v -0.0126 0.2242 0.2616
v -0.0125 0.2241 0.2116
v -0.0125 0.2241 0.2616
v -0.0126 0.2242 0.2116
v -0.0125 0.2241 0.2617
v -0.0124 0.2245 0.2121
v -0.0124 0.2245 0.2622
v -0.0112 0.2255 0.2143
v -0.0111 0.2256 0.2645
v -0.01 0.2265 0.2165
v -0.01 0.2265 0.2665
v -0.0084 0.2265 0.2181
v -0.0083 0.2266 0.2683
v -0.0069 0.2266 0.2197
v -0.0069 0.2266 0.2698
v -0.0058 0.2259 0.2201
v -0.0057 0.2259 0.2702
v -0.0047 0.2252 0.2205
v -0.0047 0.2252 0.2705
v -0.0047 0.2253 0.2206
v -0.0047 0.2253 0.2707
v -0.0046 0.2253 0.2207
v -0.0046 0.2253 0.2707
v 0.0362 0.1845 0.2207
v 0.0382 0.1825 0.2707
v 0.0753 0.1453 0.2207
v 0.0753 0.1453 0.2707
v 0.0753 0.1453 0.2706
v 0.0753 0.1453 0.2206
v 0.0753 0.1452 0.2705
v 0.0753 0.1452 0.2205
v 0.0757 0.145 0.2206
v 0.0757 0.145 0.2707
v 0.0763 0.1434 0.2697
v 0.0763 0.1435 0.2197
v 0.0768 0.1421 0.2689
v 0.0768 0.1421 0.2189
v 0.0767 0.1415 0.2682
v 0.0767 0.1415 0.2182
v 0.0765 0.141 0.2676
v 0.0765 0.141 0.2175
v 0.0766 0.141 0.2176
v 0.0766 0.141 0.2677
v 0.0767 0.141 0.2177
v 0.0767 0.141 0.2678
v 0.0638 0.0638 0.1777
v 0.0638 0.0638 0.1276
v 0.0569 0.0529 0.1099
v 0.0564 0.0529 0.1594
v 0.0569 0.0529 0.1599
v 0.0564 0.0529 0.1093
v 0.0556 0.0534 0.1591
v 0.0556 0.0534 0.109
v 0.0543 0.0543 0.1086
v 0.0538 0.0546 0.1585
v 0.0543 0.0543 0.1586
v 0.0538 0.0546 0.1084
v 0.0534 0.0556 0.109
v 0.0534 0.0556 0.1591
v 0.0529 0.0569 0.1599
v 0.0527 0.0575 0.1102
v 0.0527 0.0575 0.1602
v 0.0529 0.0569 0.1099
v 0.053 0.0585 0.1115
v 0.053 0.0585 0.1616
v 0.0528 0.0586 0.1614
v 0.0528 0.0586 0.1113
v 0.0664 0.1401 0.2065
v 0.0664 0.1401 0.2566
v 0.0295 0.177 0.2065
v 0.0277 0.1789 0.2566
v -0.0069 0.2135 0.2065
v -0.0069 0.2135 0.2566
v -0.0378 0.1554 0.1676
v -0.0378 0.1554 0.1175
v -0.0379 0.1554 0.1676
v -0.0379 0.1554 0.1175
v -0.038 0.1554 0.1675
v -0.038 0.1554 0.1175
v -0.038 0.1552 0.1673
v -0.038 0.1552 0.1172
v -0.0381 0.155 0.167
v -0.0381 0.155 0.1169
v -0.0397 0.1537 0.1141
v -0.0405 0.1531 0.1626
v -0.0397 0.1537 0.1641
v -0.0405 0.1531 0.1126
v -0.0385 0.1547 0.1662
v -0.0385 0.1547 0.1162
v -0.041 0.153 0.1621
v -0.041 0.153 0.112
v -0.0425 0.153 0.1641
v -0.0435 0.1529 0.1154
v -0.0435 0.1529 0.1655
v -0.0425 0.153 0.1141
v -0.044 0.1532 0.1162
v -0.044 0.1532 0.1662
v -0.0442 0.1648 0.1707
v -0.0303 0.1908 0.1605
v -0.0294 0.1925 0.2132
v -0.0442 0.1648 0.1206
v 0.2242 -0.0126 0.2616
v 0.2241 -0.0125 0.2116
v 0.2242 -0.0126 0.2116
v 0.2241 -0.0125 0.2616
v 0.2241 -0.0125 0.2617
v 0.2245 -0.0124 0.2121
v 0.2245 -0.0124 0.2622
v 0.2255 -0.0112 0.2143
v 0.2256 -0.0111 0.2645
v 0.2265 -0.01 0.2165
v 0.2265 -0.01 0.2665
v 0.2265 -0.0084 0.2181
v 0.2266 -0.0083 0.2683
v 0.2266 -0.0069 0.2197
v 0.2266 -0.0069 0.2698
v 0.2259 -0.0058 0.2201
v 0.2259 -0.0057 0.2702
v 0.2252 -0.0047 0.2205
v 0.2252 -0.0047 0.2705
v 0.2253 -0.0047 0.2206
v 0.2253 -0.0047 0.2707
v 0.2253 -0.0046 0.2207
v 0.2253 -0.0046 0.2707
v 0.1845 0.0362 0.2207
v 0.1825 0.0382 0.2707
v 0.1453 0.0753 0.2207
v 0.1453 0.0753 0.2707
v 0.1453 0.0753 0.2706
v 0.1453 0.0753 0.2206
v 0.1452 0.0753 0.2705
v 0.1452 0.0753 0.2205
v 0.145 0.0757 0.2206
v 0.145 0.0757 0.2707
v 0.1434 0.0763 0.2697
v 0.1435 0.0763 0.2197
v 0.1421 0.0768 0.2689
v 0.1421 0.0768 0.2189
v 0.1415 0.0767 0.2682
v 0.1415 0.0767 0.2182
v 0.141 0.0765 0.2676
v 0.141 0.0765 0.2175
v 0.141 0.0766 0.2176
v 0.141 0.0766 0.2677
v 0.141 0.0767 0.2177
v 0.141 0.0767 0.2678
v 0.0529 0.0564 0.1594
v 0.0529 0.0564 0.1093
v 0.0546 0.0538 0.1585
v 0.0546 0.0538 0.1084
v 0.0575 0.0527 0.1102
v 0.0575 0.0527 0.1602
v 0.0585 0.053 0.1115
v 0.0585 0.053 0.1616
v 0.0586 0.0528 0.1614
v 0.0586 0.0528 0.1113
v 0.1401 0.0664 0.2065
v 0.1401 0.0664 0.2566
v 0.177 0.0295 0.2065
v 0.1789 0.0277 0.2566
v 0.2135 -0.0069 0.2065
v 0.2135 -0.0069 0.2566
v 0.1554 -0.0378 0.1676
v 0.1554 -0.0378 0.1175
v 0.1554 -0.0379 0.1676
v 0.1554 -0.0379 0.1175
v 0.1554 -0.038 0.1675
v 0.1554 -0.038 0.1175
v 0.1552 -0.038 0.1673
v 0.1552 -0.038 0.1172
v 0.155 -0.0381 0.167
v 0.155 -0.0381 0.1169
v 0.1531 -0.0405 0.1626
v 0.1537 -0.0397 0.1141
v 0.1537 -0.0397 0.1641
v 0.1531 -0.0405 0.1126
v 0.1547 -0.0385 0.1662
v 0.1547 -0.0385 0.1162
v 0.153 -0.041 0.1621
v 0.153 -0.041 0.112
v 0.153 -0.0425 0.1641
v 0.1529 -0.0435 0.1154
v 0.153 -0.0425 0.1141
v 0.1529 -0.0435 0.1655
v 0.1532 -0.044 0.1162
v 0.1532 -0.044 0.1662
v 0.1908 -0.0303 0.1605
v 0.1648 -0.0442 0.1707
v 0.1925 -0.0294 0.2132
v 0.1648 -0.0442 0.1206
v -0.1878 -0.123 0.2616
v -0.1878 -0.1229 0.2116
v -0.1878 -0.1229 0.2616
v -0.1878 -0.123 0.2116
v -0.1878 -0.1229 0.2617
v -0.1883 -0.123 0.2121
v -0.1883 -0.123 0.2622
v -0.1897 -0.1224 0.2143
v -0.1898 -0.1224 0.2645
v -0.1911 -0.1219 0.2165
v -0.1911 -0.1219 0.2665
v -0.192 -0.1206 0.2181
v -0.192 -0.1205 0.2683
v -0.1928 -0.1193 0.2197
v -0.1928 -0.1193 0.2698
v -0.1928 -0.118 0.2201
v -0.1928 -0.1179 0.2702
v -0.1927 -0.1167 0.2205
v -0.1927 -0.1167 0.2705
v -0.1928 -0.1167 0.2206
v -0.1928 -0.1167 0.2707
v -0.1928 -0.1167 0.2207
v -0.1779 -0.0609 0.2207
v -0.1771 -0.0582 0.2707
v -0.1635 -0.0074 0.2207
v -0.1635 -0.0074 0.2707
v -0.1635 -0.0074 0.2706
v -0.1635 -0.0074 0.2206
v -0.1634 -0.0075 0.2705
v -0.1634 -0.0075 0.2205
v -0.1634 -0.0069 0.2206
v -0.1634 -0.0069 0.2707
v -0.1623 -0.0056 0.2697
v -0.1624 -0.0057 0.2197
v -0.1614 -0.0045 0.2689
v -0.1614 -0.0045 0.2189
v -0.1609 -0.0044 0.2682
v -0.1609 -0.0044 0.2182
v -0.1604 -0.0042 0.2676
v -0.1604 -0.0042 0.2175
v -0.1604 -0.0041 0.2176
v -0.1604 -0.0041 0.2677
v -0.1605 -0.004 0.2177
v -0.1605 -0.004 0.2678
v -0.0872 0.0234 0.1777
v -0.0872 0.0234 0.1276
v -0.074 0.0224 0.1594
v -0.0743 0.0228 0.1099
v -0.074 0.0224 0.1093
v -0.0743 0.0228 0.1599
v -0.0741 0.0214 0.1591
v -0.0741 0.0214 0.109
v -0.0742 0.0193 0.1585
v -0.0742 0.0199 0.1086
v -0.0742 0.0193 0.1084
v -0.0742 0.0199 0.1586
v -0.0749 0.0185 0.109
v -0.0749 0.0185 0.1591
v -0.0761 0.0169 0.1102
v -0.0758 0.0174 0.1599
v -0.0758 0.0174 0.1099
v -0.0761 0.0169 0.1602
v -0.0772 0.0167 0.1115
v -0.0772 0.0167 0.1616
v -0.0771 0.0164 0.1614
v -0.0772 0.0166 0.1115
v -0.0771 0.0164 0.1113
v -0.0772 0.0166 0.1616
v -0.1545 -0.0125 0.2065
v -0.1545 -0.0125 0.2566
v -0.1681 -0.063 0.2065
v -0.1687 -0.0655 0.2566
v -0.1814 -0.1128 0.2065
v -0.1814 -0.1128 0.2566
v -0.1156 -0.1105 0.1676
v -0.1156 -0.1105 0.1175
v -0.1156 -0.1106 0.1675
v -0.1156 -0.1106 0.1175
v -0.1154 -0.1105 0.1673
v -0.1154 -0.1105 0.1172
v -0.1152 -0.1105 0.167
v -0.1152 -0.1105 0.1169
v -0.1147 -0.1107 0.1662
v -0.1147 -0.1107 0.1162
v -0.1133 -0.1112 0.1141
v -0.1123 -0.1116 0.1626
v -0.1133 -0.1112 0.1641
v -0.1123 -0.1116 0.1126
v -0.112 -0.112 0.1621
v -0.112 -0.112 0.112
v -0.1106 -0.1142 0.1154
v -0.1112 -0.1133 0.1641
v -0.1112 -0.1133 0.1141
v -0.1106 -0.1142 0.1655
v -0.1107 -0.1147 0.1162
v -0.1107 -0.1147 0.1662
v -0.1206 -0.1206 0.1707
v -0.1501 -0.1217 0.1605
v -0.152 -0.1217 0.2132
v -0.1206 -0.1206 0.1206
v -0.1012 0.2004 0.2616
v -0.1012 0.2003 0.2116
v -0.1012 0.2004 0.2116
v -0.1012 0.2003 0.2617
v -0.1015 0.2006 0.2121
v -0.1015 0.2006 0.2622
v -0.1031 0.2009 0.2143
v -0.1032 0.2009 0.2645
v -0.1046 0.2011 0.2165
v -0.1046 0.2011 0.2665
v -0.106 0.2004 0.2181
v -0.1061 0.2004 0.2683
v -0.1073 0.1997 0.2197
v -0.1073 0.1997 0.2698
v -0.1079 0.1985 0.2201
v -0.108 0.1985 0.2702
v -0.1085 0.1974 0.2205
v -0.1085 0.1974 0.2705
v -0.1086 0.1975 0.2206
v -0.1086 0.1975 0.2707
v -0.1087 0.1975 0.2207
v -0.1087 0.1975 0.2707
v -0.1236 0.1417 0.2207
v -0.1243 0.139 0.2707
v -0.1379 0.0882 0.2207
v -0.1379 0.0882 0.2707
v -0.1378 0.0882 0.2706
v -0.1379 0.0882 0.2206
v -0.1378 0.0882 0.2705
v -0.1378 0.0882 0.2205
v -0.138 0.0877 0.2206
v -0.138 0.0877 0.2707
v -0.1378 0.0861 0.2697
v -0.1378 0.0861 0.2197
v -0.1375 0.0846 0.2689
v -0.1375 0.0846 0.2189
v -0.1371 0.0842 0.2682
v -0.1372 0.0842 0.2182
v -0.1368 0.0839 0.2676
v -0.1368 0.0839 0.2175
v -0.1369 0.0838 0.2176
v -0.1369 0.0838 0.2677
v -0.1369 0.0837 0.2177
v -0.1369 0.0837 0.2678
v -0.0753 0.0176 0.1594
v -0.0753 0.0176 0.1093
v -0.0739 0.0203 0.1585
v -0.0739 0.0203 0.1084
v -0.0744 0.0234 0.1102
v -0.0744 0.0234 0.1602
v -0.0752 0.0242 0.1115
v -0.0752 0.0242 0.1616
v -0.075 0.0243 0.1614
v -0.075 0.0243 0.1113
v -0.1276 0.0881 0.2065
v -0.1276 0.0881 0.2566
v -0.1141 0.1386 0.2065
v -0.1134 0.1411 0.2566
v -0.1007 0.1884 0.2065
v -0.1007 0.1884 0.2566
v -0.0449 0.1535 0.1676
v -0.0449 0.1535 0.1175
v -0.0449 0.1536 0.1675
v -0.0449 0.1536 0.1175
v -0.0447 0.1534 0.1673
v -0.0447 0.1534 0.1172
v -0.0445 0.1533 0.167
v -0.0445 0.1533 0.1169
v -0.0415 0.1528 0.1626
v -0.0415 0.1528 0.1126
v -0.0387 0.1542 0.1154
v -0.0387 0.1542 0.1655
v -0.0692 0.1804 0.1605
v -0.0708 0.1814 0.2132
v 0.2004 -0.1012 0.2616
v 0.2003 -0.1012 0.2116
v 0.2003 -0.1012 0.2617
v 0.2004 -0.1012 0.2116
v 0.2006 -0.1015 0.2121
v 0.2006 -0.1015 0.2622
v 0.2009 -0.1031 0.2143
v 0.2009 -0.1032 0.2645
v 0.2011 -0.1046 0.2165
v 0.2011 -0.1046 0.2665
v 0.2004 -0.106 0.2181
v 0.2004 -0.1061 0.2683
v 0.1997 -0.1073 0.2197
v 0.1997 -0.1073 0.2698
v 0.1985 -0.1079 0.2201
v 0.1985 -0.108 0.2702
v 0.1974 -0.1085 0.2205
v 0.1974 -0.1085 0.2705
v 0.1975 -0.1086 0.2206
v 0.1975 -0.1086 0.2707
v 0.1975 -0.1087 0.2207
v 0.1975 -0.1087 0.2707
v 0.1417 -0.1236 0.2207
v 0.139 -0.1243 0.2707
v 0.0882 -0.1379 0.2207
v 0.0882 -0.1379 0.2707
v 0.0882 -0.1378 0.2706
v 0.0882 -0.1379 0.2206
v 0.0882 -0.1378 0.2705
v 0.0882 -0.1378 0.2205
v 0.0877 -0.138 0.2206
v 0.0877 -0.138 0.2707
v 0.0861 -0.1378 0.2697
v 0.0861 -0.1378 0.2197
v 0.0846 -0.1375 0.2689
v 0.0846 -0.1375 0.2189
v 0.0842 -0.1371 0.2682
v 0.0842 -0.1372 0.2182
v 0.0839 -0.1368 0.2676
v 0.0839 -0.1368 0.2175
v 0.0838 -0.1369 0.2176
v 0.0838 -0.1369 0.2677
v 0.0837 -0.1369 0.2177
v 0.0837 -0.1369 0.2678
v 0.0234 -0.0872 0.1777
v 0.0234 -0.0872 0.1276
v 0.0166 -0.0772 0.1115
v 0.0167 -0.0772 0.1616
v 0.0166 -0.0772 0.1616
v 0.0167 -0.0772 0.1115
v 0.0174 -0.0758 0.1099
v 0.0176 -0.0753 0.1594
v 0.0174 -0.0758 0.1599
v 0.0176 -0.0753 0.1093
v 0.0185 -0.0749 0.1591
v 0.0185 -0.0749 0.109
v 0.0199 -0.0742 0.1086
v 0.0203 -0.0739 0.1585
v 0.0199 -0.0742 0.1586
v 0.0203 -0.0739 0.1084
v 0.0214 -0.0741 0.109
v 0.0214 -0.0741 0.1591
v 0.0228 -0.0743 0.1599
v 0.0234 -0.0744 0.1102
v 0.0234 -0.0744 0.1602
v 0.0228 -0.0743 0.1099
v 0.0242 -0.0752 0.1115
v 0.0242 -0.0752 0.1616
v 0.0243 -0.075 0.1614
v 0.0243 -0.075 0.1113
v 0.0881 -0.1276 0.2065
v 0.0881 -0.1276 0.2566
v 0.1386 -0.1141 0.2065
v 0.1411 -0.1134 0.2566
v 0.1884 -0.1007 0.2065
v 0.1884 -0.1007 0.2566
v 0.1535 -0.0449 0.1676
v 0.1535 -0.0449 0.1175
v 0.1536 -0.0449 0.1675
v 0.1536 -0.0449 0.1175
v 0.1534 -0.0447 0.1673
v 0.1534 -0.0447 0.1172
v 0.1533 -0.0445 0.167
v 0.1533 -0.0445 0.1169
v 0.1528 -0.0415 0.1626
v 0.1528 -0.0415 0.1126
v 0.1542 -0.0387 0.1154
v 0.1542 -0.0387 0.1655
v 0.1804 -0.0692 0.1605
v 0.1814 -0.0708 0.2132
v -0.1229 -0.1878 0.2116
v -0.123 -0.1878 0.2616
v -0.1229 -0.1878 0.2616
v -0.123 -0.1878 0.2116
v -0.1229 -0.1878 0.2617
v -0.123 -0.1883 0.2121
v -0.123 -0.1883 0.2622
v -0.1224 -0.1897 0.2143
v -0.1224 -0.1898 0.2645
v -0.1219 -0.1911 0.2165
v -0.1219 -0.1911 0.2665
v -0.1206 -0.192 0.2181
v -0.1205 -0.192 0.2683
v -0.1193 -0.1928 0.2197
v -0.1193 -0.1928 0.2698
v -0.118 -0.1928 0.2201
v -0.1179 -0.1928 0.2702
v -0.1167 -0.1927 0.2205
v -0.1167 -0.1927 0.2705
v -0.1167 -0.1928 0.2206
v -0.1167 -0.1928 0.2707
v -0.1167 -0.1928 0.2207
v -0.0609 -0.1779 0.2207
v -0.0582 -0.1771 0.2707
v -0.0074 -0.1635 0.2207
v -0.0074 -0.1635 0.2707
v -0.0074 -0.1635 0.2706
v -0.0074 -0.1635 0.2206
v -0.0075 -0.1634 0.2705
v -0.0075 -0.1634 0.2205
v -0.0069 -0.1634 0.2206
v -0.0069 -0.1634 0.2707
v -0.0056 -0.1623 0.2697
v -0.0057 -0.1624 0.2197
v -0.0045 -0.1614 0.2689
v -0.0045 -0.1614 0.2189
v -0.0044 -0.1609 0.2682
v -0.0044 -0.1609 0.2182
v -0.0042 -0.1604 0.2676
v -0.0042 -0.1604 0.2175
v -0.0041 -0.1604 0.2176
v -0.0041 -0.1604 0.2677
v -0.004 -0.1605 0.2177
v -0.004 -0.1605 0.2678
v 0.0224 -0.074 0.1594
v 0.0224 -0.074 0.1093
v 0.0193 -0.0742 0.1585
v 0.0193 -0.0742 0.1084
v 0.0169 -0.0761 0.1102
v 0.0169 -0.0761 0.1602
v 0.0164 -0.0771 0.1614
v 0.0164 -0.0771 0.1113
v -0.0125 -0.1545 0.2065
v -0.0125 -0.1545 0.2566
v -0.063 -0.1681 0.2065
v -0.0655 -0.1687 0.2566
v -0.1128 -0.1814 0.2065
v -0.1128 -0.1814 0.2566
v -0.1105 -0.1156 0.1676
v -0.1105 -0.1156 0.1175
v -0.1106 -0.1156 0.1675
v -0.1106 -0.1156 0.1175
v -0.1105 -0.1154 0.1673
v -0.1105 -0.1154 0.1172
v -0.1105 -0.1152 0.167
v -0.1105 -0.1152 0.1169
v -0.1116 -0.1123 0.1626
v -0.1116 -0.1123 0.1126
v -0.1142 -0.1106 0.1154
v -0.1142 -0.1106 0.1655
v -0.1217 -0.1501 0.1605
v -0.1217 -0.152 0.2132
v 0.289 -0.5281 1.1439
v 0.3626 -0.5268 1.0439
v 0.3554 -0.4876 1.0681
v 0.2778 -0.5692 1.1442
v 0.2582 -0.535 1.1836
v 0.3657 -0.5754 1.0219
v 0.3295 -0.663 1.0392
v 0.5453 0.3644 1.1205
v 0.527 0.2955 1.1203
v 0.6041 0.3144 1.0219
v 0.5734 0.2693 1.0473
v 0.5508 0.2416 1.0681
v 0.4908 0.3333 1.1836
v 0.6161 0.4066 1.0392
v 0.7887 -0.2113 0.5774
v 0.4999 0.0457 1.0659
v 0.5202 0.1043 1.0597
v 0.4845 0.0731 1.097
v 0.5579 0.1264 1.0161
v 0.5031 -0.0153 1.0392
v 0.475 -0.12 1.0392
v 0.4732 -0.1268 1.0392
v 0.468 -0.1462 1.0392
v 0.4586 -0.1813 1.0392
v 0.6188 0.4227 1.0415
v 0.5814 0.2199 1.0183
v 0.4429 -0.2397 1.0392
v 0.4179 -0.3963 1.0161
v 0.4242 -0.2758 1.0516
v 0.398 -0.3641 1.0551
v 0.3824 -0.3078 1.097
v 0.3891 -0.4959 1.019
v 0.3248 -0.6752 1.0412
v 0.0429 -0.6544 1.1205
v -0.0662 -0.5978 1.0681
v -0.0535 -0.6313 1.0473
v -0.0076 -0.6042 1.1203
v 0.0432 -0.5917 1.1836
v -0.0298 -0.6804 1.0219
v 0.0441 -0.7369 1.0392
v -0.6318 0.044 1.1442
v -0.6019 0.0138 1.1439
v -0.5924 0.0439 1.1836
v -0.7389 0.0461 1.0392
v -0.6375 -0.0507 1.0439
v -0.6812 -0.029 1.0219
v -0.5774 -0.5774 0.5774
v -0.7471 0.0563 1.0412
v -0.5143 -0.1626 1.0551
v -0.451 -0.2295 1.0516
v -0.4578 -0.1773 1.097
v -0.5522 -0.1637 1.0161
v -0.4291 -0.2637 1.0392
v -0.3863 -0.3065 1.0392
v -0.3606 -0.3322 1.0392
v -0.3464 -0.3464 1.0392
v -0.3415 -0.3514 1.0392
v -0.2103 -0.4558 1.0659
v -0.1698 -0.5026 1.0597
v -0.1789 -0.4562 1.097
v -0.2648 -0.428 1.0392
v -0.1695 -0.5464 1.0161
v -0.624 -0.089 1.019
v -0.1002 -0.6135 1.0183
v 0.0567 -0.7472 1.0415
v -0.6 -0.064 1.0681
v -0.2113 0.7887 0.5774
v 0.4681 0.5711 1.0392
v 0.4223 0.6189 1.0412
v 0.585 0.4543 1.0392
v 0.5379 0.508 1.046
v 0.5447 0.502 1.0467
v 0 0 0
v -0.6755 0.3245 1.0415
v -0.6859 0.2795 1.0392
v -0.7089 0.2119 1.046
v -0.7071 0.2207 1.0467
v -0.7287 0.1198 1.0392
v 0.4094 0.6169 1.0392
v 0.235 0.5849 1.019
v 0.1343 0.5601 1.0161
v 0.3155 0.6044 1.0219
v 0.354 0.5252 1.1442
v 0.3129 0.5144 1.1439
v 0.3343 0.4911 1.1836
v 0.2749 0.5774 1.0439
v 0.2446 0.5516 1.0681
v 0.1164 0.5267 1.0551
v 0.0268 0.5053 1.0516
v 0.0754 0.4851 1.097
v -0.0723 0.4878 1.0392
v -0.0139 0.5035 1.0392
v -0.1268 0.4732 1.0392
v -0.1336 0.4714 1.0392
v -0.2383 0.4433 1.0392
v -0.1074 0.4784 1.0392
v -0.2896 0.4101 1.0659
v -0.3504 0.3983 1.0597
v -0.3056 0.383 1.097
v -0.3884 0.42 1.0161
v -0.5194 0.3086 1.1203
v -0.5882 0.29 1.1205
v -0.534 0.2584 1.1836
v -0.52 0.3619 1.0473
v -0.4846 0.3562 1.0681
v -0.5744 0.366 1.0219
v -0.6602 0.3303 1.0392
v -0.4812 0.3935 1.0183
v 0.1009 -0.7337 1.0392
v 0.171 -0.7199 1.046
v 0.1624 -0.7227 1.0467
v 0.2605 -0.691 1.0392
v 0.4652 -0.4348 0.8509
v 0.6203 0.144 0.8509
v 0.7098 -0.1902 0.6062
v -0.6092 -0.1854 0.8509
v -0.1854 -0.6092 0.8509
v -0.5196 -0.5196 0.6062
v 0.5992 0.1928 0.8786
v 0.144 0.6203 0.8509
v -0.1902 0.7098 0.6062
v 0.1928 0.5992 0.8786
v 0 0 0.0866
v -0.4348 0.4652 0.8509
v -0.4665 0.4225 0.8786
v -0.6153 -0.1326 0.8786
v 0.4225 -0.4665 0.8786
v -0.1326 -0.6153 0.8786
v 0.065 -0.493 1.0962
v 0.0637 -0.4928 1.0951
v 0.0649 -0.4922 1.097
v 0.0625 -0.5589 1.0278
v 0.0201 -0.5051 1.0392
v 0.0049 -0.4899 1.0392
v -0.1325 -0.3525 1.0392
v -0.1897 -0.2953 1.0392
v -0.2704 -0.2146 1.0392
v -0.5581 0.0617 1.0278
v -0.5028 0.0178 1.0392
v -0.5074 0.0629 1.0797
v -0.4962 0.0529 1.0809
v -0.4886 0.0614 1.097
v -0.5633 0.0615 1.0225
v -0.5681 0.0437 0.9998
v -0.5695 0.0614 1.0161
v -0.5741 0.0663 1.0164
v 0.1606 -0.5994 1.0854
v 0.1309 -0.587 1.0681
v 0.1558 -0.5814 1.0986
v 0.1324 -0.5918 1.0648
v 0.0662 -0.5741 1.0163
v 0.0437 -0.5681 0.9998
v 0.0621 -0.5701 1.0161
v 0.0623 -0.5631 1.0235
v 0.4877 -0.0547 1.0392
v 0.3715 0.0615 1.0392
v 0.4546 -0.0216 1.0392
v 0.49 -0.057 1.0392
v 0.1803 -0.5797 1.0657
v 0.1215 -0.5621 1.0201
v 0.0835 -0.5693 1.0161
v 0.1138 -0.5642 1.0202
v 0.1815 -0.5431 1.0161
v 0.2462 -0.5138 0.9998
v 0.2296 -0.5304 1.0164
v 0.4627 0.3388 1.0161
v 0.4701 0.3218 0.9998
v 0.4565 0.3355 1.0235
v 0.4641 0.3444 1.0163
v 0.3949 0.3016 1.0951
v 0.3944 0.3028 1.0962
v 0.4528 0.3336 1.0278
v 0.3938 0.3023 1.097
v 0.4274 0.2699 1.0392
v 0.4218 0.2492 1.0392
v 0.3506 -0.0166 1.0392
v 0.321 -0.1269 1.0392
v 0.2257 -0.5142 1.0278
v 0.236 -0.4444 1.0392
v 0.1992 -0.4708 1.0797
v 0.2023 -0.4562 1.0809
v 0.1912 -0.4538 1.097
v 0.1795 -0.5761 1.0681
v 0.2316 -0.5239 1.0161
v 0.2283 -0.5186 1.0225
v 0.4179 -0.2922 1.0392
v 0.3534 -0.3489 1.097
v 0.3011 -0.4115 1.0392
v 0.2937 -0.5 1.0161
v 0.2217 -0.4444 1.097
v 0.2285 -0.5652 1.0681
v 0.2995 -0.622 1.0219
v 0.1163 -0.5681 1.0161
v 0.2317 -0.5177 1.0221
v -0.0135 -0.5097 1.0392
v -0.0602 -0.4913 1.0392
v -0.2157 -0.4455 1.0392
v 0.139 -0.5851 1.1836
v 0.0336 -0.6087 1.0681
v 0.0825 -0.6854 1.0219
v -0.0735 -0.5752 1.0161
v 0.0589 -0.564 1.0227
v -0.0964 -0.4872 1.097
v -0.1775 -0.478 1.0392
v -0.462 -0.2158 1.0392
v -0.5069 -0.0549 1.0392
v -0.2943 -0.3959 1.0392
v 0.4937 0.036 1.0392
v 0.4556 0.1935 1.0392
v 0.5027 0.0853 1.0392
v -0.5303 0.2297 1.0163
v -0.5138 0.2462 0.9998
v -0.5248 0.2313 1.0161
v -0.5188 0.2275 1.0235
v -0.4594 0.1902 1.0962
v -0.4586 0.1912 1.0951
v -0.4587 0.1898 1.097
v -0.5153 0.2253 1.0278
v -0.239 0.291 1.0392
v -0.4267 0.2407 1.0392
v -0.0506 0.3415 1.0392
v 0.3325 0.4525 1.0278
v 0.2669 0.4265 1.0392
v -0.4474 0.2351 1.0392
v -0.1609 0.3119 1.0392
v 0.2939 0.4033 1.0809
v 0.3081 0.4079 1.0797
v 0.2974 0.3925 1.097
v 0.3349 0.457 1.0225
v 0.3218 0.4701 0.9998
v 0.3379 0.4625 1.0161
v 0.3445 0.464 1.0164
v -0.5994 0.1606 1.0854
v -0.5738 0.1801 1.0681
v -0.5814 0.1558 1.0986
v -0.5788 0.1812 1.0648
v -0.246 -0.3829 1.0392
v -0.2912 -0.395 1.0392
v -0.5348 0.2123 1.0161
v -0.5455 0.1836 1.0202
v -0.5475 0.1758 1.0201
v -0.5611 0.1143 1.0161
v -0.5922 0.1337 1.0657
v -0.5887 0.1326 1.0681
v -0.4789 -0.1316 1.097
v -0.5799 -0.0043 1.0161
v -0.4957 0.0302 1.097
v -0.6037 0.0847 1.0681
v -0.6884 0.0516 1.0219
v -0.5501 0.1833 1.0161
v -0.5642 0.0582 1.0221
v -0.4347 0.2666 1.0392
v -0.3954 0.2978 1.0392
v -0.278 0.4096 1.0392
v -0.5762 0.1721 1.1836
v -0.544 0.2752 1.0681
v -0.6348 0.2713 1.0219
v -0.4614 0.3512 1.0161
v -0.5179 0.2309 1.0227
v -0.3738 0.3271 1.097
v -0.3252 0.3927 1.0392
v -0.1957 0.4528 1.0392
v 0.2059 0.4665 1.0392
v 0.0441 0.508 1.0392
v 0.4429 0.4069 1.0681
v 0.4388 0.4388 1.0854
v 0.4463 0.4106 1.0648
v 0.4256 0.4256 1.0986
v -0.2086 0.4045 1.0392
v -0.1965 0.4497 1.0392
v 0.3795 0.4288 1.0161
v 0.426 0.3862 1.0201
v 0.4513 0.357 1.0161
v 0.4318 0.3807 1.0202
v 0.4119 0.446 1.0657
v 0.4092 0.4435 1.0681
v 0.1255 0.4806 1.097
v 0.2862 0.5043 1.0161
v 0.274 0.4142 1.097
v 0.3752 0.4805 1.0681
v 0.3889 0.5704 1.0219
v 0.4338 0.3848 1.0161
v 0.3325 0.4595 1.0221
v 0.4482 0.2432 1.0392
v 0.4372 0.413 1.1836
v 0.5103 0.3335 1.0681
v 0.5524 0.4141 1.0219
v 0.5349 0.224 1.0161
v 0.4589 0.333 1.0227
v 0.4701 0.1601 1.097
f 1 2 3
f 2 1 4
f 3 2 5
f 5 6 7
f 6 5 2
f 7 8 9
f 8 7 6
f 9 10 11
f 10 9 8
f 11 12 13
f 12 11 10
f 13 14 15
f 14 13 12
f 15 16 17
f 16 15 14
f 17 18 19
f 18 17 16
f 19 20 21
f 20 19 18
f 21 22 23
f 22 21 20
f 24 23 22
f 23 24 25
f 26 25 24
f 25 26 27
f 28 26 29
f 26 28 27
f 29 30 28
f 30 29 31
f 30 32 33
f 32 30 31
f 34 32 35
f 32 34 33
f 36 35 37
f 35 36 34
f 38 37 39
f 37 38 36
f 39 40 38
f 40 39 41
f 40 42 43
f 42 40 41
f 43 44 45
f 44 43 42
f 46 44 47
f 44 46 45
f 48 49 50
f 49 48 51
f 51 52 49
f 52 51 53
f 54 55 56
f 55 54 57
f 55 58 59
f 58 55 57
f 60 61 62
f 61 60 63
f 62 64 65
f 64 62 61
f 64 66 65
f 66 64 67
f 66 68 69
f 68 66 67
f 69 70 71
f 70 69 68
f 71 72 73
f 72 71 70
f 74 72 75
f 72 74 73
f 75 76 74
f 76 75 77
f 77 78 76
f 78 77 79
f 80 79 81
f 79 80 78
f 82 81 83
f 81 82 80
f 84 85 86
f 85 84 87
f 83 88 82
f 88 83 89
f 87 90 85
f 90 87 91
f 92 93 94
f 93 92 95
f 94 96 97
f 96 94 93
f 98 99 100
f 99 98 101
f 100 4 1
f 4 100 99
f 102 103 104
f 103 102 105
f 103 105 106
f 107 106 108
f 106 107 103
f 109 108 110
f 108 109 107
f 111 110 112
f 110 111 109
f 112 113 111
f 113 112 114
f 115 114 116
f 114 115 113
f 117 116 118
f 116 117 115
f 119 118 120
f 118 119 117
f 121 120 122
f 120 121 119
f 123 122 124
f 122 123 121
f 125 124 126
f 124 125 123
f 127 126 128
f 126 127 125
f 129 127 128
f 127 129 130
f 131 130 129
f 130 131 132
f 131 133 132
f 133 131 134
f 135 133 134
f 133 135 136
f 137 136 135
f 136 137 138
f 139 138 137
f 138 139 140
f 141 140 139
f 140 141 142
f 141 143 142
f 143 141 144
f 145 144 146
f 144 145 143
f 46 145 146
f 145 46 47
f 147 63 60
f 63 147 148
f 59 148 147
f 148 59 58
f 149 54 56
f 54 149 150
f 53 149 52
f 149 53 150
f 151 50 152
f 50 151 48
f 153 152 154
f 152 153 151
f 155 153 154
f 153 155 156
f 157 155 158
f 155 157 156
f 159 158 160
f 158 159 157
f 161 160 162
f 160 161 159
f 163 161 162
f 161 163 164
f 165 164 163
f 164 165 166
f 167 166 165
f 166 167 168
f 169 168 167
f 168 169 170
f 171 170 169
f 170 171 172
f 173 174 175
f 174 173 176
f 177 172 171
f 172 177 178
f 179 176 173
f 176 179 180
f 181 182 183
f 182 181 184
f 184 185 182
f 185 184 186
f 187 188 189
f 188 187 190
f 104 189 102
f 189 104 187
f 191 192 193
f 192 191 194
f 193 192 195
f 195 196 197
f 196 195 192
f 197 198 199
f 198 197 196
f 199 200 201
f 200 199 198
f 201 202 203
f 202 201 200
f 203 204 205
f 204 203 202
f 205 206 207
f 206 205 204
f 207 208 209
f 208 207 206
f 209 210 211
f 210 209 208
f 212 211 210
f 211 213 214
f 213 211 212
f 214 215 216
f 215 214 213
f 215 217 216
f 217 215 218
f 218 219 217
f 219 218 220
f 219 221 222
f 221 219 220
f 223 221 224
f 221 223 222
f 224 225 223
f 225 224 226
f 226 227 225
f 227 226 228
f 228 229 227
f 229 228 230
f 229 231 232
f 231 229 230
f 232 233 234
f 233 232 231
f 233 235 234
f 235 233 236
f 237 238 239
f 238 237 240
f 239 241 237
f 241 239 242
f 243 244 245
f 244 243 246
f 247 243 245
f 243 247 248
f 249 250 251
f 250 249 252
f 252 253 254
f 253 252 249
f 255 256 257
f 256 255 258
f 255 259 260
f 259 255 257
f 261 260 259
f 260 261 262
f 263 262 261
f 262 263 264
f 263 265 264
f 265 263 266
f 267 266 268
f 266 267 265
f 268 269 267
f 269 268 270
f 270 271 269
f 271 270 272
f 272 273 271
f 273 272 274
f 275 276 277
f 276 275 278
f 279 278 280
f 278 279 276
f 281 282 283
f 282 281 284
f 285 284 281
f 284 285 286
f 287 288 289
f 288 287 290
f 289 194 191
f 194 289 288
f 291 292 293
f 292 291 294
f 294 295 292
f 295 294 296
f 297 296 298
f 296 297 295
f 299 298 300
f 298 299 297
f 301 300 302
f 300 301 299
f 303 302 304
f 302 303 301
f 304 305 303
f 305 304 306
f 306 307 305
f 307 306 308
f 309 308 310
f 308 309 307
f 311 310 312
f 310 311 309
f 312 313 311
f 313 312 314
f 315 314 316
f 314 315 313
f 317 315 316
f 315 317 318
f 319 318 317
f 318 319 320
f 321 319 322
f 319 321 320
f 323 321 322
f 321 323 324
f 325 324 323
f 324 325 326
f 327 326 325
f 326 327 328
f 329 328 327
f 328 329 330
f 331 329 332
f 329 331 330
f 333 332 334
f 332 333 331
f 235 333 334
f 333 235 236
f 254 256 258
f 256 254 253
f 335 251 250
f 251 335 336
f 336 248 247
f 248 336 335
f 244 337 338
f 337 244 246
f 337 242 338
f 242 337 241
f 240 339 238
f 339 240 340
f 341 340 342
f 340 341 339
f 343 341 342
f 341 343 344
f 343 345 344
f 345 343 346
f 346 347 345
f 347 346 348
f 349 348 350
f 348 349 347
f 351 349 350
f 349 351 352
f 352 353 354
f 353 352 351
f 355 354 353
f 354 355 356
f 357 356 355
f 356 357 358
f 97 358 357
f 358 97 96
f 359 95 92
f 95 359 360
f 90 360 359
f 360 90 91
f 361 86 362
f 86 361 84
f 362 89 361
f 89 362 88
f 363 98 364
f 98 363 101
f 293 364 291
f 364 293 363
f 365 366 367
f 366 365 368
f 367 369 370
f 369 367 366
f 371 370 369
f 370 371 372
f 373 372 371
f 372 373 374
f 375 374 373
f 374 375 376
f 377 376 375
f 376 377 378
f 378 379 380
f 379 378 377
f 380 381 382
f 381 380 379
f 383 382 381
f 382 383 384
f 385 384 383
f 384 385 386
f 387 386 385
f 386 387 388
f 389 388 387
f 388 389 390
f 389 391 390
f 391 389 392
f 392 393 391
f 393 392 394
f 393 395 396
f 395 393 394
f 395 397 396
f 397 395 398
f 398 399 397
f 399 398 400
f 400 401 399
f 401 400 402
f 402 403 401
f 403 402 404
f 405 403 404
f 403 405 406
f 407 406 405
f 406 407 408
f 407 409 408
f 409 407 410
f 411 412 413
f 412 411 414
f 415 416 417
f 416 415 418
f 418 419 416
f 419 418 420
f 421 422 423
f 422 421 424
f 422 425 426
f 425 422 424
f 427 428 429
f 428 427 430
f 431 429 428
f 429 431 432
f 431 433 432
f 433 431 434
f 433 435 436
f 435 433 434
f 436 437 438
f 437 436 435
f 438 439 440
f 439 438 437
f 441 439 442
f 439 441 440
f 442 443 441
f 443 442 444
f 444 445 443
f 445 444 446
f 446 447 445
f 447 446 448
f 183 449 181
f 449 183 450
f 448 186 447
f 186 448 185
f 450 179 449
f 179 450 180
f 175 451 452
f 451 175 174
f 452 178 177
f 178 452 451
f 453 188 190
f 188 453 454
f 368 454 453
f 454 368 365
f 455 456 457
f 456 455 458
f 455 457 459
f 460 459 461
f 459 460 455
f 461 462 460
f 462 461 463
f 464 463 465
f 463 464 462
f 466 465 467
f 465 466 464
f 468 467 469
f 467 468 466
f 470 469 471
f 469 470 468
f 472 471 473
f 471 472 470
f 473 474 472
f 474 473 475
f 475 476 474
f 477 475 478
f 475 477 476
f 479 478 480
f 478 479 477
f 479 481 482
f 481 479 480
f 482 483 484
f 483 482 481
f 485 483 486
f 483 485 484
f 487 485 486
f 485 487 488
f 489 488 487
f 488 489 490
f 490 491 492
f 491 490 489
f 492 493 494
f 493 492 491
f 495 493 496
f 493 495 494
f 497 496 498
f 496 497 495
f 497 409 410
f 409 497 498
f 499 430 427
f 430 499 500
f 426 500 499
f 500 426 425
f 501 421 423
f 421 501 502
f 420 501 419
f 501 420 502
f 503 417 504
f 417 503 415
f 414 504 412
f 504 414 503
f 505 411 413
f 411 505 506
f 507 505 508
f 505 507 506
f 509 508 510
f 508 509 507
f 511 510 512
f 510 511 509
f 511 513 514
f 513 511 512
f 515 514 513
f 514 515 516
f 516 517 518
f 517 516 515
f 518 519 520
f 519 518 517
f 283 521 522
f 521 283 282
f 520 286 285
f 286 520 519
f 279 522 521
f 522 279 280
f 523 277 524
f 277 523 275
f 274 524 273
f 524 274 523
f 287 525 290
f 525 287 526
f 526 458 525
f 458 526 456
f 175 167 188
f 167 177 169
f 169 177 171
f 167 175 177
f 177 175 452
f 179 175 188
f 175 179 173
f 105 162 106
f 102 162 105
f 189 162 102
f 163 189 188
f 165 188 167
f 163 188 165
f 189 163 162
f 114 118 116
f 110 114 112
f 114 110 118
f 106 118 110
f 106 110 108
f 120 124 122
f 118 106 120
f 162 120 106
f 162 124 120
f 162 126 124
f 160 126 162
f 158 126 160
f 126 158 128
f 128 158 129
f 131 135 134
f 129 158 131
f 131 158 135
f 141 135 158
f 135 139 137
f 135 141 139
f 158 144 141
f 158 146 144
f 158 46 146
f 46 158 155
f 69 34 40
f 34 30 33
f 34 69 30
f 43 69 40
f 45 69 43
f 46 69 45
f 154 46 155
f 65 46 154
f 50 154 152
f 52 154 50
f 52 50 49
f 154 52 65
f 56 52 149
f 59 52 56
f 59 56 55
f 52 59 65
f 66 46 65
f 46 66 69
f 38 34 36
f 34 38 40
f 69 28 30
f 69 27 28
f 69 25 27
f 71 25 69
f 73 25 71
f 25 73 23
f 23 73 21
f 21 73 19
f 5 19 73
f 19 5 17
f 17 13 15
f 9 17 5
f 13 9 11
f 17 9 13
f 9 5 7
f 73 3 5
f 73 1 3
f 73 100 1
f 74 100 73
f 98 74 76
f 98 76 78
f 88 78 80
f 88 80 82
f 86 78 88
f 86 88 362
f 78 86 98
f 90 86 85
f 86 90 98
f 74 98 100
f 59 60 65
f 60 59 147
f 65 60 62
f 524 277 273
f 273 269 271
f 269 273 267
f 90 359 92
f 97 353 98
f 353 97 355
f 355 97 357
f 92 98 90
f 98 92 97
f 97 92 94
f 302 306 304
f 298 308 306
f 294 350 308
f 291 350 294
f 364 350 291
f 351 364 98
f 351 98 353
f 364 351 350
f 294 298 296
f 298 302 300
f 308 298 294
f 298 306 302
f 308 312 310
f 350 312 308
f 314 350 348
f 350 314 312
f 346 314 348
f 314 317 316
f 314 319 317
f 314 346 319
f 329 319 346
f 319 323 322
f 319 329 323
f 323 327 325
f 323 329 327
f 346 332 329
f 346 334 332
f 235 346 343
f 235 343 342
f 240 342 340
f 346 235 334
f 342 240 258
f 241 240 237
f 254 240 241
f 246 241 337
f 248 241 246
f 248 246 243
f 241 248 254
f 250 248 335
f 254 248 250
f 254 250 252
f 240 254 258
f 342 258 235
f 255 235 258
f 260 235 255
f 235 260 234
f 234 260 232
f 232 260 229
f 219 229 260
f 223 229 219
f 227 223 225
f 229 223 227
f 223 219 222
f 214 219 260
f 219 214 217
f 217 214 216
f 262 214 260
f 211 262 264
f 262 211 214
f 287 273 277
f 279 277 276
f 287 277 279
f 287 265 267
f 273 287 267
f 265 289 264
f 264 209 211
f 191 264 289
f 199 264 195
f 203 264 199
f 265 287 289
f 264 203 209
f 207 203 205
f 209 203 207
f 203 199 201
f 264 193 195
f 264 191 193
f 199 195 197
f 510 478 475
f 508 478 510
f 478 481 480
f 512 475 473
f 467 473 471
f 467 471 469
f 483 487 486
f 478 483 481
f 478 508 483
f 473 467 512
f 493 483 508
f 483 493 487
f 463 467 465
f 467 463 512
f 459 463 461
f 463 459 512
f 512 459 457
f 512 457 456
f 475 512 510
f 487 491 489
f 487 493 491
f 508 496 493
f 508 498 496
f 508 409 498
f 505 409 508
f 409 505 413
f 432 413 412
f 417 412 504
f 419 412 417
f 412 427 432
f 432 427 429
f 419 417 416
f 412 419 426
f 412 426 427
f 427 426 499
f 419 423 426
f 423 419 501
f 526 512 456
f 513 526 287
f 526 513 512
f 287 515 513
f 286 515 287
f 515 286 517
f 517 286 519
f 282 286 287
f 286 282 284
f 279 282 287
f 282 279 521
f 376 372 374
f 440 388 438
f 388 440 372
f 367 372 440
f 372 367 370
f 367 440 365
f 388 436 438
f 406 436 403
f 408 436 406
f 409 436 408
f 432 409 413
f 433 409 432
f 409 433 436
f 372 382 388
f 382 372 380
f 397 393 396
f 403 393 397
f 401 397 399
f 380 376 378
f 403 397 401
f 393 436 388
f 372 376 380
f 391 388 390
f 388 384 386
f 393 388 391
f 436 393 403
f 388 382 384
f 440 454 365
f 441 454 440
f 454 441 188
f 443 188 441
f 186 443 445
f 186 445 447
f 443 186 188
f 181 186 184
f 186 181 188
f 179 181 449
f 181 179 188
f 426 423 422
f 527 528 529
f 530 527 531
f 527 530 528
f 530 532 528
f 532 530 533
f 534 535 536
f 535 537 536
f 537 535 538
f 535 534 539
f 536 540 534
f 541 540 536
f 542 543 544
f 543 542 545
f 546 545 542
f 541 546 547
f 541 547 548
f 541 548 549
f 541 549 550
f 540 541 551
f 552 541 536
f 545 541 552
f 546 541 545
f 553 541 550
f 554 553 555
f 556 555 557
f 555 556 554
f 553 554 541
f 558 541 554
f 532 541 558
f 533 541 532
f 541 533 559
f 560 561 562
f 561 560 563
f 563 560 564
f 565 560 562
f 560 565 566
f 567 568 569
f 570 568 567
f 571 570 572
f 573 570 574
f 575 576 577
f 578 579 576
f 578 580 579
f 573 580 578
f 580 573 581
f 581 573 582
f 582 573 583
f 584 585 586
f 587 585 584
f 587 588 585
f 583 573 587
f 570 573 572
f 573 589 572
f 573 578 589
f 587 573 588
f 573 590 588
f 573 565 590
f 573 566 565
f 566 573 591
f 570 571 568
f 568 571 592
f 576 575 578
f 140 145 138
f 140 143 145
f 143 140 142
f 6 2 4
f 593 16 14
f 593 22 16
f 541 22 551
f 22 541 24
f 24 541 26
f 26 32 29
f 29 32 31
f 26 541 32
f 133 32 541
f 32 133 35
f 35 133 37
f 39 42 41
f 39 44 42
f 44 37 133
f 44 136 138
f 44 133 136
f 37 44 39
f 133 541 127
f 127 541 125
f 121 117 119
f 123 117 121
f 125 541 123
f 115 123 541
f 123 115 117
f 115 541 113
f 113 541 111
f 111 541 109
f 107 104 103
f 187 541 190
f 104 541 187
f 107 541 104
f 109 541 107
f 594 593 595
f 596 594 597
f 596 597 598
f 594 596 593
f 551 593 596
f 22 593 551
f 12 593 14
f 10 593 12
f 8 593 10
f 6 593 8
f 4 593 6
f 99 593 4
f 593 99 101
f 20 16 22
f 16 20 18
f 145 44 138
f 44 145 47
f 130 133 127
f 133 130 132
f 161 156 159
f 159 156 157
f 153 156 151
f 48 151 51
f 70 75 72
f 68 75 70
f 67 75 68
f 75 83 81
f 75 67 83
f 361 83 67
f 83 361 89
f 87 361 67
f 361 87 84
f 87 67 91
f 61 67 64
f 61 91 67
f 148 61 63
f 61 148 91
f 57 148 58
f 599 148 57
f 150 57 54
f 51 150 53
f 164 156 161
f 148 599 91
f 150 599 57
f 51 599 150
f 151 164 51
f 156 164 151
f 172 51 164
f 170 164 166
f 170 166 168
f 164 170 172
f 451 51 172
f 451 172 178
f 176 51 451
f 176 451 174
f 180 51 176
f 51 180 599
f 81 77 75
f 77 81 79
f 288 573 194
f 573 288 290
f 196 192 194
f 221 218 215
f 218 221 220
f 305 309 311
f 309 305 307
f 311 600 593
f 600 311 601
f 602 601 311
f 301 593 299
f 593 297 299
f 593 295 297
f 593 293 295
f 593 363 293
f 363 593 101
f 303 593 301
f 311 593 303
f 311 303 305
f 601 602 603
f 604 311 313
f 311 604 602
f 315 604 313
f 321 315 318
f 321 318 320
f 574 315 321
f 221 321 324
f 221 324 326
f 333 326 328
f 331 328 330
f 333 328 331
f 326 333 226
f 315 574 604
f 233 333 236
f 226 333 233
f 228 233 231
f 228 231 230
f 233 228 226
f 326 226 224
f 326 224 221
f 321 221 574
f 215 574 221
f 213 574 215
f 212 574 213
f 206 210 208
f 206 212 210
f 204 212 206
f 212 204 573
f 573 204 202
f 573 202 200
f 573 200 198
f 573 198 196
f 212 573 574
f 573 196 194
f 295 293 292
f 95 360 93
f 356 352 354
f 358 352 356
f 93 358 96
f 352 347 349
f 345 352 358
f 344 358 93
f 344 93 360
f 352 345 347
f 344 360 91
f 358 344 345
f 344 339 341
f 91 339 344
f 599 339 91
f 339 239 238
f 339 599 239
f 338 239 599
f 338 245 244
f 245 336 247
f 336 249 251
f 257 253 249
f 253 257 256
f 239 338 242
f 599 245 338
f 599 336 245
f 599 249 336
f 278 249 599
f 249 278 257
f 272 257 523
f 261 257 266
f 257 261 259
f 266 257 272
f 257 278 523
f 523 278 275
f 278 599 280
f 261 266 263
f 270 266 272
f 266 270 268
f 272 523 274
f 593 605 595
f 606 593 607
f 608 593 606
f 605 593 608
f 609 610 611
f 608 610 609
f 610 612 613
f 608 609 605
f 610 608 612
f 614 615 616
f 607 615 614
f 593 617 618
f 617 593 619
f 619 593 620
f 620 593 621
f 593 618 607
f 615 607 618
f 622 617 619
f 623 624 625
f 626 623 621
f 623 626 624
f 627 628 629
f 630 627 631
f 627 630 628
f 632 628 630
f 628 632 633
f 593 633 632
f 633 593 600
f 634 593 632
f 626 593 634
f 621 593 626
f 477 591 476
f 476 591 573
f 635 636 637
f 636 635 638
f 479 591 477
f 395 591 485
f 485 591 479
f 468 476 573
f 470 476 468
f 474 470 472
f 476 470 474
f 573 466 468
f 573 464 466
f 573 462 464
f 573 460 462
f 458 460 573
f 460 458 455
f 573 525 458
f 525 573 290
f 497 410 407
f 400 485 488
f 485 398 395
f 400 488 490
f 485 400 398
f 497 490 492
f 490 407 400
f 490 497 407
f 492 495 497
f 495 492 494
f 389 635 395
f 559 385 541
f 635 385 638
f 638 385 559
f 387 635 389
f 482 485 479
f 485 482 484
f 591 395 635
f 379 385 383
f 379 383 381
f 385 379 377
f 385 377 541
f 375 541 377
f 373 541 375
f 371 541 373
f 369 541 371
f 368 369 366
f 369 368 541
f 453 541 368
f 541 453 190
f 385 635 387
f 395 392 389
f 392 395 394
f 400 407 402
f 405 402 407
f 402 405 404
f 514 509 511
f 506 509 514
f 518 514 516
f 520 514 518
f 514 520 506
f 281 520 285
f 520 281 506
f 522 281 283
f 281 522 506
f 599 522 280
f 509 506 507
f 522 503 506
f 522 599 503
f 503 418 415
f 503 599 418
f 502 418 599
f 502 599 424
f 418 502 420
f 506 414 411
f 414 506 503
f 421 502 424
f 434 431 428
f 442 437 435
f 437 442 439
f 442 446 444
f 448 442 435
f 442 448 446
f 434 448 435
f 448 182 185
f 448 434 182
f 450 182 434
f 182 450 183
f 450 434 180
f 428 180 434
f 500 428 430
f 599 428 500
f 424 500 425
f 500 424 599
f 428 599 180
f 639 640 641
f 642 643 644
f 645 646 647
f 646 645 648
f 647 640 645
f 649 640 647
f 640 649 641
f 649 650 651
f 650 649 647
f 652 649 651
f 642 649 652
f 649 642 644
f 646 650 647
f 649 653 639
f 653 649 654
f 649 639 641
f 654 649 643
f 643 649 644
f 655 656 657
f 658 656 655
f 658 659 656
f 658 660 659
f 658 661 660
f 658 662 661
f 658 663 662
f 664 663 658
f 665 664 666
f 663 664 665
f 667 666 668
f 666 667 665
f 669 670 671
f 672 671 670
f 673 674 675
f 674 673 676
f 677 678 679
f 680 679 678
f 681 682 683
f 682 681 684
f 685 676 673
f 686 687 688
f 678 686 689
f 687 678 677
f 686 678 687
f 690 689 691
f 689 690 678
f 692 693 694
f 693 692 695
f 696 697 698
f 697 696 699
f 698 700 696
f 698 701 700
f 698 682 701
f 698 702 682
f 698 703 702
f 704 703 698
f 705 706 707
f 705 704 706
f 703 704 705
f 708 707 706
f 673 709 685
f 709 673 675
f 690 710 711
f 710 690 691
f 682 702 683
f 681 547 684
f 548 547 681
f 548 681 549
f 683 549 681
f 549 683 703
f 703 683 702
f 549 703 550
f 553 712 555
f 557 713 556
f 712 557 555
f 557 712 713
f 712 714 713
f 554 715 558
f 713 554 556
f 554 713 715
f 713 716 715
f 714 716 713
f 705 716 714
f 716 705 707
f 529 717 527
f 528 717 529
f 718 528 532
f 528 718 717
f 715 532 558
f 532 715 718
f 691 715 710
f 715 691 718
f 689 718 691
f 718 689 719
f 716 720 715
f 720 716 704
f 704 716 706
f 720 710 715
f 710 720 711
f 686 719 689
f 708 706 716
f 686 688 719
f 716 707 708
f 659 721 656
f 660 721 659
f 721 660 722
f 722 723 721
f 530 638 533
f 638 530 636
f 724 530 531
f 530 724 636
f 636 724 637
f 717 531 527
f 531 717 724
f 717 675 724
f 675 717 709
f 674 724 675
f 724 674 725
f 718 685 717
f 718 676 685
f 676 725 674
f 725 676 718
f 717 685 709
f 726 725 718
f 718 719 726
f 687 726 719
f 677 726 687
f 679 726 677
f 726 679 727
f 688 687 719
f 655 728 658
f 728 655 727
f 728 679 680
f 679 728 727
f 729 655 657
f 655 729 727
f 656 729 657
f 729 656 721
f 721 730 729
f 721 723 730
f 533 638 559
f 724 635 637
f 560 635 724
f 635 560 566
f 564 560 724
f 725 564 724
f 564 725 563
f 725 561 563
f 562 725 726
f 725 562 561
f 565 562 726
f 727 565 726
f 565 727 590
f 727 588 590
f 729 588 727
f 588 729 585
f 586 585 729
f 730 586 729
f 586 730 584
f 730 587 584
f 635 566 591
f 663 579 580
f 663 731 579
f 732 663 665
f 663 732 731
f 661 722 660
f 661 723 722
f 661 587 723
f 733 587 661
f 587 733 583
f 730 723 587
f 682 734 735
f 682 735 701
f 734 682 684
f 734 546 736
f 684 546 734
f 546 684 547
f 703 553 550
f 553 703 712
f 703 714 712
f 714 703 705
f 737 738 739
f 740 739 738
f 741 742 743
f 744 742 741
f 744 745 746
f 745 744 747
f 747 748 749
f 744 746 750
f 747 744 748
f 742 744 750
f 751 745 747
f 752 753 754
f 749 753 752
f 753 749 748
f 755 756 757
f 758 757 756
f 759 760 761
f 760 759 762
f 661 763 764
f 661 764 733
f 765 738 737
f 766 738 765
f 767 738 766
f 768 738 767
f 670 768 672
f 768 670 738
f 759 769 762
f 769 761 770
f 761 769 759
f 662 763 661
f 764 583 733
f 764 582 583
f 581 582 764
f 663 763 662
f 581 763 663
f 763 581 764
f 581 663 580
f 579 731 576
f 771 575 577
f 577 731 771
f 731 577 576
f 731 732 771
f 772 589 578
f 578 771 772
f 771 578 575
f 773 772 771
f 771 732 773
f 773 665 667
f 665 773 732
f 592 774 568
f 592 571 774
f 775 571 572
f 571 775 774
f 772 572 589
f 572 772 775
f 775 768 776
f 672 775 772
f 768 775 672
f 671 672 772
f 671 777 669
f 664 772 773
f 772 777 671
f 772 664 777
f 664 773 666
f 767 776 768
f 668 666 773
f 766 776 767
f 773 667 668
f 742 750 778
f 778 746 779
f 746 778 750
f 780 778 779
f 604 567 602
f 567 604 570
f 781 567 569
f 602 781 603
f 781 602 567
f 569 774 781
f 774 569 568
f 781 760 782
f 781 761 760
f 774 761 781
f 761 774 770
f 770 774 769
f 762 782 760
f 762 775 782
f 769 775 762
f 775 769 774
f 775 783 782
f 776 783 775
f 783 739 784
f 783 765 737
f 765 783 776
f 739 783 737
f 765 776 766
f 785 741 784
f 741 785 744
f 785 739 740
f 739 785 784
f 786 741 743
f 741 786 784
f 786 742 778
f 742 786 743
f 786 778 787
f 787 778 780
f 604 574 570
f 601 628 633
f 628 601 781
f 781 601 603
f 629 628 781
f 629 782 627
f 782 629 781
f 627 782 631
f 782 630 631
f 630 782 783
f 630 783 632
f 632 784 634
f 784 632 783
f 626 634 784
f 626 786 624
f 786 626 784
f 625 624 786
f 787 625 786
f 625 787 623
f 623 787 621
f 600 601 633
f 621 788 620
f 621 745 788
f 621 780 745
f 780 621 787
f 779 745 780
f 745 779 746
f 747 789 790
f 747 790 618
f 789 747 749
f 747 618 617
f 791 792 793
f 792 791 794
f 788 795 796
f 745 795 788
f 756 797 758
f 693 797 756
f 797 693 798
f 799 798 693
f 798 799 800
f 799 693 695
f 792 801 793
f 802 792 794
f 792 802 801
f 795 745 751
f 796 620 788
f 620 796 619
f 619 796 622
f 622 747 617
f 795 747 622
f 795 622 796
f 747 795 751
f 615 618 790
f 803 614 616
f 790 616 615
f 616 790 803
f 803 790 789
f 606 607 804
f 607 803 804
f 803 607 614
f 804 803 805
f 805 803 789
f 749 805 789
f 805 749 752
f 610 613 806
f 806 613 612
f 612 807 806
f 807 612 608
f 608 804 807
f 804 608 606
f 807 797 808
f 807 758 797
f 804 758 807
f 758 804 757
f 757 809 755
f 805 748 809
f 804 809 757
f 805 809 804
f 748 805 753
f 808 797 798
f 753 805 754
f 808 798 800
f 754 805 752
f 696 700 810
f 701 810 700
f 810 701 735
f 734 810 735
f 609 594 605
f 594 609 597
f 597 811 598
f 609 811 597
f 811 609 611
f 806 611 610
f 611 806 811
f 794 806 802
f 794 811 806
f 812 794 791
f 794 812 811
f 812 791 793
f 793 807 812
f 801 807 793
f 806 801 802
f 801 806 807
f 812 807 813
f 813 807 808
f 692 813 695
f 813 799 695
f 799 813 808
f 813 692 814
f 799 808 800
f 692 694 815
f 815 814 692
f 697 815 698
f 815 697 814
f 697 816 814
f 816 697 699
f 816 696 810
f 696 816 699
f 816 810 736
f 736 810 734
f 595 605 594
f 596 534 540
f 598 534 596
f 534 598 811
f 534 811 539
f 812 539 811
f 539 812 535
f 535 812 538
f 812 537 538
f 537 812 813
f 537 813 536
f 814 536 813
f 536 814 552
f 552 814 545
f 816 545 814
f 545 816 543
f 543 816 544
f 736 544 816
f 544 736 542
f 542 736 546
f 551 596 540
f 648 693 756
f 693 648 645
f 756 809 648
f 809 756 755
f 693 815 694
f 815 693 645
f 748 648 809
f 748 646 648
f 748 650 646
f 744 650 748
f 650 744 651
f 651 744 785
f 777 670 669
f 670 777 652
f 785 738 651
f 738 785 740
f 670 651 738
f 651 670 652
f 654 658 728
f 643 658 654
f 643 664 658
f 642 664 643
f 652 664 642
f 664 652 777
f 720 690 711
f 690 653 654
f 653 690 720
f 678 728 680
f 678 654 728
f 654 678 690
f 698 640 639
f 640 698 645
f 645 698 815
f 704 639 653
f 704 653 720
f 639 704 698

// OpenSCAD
include <extrude_test2.scad>
include <rails.scad>
include <print_cube.scad>


cut_latch_alpha = 0.95;
cut_latch_beta = 1.2;
latch_beta_cutout = 0.58;

rotate(atan(sqrt(2)), v=[1,-1,0])
cube_alpha();

//translate([0,0,sqrt(3)]) rotate(180+atan(sqrt(2)), v=[1,-1,0]) 
//cube_beta();

//cube_C();
//cube_D();
//latch_beta();
//latch_alpha();


module cube_alpha() {
    pattern1 = [[.2,0],[.3,.07],[.22,.15],[.1,.1]];
    pattern2 = [[.8,0],[.7,.03], [.55,.12],[.62,.15],[.65,.25],[.56,.28],[.55,.4],[.45,.38],[.38,.29],[.3, .3]];
    pattern3a = [[1,.2], [.9, .2], [.82,.3],[.88,.4],[.9,.35],[.93,.5],[.8,.45],[.77,.5],[.65,.5],[.68,.63],[.66,.66]];
    pattern3b = [[1.0, .8], [0.9, 0.7], [.85, .85]];
    
    
    difference() {
        cube();
        translate([wall_thickness,wall_thickness,wall_thickness])
        cube([1,1,1]*(1-2*wall_thickness));
        rotate(-atan(sqrt(2)), v=[1,-1,0])
        translate([0,0,
1+cut_latch_alpha+0.01])
        cube([2,2,2], center=true);
        
        cut_all(pattern1);
        //cut_all(pattern2);
        //cut_all(pattern3a);
        //translate([1,1,1]) rotate(60, [1,1,1]) mirror([1,1,1])
        //cut_all(pattern3b);
    }
    
    
    //cube_C();
    latch_alpha();
    
    /*
    translate([0,0,1]) rail_B();
    rotate(120, [1,1,1]) translate([0,0,1]) rail_B();
    rotate(240, [1,1,1]) translate([0,0,1]) rail_B();
    */
}
module cube_beta() {
    difference() {
        cube();
        translate([wall_thickness,wall_thickness,wall_thickness])
        cube([1,1,1]*(1-2*wall_thickness));
        rotate(-atan(sqrt(2)), v=[1,-1,0])
        translate([0,0,-1+cut_latch_beta-0.01])
        cube([2,2,2], center=true);
        
        //cut_all(pattern1);
        //cut_all(pattern2);
        //cut_all(pattern3a);
        //translate([1,1,1]) rotate(60, [1,1,1]) mirror([1,1,1])
        //cut_all(pattern3b);
    }
    
    latch_beta();
    
    translate([0,0,1]) {
        rail_A_positioned();
        rail_C_positioned();
    }
    rotate(120, [1,1,1]) translate([0,0,1])  {
        rail_A_positioned();
        rail_C_positioned();
    }
    rotate(240, [1,1,1]) translate([0,0,1])  {
        rail_A_positioned();
        rail_C_positioned();
    }
}

module latch_alpha() {
    
    difference() {
        cube_bottom();
        
        magic_pyramid();
        
        //rotate([0,0,180])
        //rotate(atan(sqrt(2)), v=[1,-1,0])
        //translate([0,0,-1+cut_latch_alpha])
        //cube([2,2,2], center=true);
        
    }
}
module latch_beta() {
    difference() {
        cube_top();
        
        rotate(-atan(sqrt(2)), v=[1,-1,0])
        linear_extrude(2)
        rotate(45)
        circle(latch_beta_cutout,$fn=3);
    }
}


module magic_pyramid() {
    // magic shape to cut away to allow the wall thickness to change gradually
    // "Angle" is the overhang angle we have to print, but it's helped by some nearby things with more gradual overhang
    // if you want to adjust angle, you will have to adjust angle_radius too
    // I never want to touch it again
    flat_radius = 0.56;
    angle = 50;
    angle_radius = 0.98;
    
    
    rotate(-atan(sqrt(2)), v=[1,-1,0])
    translate([0,0,.5]) rotate(45)
    difference() {
        cube(1.65, center=true);
        for (i = [0:2] ) {
            translate([0,0,1.7])
            cube(2, center=true);
            
            rotate(120*i)
            translate([flat_radius,0,0])
            translate([1,0,0]) cube(2, center=true);
            
            
            rotate(60+120*i)
            translate([angle_radius,0,0])
            rotate(-angle, [0,1,0])
            translate([1,0,0]) cube(2, center=true);
        }
    }
}

 //magic_pyramid();
